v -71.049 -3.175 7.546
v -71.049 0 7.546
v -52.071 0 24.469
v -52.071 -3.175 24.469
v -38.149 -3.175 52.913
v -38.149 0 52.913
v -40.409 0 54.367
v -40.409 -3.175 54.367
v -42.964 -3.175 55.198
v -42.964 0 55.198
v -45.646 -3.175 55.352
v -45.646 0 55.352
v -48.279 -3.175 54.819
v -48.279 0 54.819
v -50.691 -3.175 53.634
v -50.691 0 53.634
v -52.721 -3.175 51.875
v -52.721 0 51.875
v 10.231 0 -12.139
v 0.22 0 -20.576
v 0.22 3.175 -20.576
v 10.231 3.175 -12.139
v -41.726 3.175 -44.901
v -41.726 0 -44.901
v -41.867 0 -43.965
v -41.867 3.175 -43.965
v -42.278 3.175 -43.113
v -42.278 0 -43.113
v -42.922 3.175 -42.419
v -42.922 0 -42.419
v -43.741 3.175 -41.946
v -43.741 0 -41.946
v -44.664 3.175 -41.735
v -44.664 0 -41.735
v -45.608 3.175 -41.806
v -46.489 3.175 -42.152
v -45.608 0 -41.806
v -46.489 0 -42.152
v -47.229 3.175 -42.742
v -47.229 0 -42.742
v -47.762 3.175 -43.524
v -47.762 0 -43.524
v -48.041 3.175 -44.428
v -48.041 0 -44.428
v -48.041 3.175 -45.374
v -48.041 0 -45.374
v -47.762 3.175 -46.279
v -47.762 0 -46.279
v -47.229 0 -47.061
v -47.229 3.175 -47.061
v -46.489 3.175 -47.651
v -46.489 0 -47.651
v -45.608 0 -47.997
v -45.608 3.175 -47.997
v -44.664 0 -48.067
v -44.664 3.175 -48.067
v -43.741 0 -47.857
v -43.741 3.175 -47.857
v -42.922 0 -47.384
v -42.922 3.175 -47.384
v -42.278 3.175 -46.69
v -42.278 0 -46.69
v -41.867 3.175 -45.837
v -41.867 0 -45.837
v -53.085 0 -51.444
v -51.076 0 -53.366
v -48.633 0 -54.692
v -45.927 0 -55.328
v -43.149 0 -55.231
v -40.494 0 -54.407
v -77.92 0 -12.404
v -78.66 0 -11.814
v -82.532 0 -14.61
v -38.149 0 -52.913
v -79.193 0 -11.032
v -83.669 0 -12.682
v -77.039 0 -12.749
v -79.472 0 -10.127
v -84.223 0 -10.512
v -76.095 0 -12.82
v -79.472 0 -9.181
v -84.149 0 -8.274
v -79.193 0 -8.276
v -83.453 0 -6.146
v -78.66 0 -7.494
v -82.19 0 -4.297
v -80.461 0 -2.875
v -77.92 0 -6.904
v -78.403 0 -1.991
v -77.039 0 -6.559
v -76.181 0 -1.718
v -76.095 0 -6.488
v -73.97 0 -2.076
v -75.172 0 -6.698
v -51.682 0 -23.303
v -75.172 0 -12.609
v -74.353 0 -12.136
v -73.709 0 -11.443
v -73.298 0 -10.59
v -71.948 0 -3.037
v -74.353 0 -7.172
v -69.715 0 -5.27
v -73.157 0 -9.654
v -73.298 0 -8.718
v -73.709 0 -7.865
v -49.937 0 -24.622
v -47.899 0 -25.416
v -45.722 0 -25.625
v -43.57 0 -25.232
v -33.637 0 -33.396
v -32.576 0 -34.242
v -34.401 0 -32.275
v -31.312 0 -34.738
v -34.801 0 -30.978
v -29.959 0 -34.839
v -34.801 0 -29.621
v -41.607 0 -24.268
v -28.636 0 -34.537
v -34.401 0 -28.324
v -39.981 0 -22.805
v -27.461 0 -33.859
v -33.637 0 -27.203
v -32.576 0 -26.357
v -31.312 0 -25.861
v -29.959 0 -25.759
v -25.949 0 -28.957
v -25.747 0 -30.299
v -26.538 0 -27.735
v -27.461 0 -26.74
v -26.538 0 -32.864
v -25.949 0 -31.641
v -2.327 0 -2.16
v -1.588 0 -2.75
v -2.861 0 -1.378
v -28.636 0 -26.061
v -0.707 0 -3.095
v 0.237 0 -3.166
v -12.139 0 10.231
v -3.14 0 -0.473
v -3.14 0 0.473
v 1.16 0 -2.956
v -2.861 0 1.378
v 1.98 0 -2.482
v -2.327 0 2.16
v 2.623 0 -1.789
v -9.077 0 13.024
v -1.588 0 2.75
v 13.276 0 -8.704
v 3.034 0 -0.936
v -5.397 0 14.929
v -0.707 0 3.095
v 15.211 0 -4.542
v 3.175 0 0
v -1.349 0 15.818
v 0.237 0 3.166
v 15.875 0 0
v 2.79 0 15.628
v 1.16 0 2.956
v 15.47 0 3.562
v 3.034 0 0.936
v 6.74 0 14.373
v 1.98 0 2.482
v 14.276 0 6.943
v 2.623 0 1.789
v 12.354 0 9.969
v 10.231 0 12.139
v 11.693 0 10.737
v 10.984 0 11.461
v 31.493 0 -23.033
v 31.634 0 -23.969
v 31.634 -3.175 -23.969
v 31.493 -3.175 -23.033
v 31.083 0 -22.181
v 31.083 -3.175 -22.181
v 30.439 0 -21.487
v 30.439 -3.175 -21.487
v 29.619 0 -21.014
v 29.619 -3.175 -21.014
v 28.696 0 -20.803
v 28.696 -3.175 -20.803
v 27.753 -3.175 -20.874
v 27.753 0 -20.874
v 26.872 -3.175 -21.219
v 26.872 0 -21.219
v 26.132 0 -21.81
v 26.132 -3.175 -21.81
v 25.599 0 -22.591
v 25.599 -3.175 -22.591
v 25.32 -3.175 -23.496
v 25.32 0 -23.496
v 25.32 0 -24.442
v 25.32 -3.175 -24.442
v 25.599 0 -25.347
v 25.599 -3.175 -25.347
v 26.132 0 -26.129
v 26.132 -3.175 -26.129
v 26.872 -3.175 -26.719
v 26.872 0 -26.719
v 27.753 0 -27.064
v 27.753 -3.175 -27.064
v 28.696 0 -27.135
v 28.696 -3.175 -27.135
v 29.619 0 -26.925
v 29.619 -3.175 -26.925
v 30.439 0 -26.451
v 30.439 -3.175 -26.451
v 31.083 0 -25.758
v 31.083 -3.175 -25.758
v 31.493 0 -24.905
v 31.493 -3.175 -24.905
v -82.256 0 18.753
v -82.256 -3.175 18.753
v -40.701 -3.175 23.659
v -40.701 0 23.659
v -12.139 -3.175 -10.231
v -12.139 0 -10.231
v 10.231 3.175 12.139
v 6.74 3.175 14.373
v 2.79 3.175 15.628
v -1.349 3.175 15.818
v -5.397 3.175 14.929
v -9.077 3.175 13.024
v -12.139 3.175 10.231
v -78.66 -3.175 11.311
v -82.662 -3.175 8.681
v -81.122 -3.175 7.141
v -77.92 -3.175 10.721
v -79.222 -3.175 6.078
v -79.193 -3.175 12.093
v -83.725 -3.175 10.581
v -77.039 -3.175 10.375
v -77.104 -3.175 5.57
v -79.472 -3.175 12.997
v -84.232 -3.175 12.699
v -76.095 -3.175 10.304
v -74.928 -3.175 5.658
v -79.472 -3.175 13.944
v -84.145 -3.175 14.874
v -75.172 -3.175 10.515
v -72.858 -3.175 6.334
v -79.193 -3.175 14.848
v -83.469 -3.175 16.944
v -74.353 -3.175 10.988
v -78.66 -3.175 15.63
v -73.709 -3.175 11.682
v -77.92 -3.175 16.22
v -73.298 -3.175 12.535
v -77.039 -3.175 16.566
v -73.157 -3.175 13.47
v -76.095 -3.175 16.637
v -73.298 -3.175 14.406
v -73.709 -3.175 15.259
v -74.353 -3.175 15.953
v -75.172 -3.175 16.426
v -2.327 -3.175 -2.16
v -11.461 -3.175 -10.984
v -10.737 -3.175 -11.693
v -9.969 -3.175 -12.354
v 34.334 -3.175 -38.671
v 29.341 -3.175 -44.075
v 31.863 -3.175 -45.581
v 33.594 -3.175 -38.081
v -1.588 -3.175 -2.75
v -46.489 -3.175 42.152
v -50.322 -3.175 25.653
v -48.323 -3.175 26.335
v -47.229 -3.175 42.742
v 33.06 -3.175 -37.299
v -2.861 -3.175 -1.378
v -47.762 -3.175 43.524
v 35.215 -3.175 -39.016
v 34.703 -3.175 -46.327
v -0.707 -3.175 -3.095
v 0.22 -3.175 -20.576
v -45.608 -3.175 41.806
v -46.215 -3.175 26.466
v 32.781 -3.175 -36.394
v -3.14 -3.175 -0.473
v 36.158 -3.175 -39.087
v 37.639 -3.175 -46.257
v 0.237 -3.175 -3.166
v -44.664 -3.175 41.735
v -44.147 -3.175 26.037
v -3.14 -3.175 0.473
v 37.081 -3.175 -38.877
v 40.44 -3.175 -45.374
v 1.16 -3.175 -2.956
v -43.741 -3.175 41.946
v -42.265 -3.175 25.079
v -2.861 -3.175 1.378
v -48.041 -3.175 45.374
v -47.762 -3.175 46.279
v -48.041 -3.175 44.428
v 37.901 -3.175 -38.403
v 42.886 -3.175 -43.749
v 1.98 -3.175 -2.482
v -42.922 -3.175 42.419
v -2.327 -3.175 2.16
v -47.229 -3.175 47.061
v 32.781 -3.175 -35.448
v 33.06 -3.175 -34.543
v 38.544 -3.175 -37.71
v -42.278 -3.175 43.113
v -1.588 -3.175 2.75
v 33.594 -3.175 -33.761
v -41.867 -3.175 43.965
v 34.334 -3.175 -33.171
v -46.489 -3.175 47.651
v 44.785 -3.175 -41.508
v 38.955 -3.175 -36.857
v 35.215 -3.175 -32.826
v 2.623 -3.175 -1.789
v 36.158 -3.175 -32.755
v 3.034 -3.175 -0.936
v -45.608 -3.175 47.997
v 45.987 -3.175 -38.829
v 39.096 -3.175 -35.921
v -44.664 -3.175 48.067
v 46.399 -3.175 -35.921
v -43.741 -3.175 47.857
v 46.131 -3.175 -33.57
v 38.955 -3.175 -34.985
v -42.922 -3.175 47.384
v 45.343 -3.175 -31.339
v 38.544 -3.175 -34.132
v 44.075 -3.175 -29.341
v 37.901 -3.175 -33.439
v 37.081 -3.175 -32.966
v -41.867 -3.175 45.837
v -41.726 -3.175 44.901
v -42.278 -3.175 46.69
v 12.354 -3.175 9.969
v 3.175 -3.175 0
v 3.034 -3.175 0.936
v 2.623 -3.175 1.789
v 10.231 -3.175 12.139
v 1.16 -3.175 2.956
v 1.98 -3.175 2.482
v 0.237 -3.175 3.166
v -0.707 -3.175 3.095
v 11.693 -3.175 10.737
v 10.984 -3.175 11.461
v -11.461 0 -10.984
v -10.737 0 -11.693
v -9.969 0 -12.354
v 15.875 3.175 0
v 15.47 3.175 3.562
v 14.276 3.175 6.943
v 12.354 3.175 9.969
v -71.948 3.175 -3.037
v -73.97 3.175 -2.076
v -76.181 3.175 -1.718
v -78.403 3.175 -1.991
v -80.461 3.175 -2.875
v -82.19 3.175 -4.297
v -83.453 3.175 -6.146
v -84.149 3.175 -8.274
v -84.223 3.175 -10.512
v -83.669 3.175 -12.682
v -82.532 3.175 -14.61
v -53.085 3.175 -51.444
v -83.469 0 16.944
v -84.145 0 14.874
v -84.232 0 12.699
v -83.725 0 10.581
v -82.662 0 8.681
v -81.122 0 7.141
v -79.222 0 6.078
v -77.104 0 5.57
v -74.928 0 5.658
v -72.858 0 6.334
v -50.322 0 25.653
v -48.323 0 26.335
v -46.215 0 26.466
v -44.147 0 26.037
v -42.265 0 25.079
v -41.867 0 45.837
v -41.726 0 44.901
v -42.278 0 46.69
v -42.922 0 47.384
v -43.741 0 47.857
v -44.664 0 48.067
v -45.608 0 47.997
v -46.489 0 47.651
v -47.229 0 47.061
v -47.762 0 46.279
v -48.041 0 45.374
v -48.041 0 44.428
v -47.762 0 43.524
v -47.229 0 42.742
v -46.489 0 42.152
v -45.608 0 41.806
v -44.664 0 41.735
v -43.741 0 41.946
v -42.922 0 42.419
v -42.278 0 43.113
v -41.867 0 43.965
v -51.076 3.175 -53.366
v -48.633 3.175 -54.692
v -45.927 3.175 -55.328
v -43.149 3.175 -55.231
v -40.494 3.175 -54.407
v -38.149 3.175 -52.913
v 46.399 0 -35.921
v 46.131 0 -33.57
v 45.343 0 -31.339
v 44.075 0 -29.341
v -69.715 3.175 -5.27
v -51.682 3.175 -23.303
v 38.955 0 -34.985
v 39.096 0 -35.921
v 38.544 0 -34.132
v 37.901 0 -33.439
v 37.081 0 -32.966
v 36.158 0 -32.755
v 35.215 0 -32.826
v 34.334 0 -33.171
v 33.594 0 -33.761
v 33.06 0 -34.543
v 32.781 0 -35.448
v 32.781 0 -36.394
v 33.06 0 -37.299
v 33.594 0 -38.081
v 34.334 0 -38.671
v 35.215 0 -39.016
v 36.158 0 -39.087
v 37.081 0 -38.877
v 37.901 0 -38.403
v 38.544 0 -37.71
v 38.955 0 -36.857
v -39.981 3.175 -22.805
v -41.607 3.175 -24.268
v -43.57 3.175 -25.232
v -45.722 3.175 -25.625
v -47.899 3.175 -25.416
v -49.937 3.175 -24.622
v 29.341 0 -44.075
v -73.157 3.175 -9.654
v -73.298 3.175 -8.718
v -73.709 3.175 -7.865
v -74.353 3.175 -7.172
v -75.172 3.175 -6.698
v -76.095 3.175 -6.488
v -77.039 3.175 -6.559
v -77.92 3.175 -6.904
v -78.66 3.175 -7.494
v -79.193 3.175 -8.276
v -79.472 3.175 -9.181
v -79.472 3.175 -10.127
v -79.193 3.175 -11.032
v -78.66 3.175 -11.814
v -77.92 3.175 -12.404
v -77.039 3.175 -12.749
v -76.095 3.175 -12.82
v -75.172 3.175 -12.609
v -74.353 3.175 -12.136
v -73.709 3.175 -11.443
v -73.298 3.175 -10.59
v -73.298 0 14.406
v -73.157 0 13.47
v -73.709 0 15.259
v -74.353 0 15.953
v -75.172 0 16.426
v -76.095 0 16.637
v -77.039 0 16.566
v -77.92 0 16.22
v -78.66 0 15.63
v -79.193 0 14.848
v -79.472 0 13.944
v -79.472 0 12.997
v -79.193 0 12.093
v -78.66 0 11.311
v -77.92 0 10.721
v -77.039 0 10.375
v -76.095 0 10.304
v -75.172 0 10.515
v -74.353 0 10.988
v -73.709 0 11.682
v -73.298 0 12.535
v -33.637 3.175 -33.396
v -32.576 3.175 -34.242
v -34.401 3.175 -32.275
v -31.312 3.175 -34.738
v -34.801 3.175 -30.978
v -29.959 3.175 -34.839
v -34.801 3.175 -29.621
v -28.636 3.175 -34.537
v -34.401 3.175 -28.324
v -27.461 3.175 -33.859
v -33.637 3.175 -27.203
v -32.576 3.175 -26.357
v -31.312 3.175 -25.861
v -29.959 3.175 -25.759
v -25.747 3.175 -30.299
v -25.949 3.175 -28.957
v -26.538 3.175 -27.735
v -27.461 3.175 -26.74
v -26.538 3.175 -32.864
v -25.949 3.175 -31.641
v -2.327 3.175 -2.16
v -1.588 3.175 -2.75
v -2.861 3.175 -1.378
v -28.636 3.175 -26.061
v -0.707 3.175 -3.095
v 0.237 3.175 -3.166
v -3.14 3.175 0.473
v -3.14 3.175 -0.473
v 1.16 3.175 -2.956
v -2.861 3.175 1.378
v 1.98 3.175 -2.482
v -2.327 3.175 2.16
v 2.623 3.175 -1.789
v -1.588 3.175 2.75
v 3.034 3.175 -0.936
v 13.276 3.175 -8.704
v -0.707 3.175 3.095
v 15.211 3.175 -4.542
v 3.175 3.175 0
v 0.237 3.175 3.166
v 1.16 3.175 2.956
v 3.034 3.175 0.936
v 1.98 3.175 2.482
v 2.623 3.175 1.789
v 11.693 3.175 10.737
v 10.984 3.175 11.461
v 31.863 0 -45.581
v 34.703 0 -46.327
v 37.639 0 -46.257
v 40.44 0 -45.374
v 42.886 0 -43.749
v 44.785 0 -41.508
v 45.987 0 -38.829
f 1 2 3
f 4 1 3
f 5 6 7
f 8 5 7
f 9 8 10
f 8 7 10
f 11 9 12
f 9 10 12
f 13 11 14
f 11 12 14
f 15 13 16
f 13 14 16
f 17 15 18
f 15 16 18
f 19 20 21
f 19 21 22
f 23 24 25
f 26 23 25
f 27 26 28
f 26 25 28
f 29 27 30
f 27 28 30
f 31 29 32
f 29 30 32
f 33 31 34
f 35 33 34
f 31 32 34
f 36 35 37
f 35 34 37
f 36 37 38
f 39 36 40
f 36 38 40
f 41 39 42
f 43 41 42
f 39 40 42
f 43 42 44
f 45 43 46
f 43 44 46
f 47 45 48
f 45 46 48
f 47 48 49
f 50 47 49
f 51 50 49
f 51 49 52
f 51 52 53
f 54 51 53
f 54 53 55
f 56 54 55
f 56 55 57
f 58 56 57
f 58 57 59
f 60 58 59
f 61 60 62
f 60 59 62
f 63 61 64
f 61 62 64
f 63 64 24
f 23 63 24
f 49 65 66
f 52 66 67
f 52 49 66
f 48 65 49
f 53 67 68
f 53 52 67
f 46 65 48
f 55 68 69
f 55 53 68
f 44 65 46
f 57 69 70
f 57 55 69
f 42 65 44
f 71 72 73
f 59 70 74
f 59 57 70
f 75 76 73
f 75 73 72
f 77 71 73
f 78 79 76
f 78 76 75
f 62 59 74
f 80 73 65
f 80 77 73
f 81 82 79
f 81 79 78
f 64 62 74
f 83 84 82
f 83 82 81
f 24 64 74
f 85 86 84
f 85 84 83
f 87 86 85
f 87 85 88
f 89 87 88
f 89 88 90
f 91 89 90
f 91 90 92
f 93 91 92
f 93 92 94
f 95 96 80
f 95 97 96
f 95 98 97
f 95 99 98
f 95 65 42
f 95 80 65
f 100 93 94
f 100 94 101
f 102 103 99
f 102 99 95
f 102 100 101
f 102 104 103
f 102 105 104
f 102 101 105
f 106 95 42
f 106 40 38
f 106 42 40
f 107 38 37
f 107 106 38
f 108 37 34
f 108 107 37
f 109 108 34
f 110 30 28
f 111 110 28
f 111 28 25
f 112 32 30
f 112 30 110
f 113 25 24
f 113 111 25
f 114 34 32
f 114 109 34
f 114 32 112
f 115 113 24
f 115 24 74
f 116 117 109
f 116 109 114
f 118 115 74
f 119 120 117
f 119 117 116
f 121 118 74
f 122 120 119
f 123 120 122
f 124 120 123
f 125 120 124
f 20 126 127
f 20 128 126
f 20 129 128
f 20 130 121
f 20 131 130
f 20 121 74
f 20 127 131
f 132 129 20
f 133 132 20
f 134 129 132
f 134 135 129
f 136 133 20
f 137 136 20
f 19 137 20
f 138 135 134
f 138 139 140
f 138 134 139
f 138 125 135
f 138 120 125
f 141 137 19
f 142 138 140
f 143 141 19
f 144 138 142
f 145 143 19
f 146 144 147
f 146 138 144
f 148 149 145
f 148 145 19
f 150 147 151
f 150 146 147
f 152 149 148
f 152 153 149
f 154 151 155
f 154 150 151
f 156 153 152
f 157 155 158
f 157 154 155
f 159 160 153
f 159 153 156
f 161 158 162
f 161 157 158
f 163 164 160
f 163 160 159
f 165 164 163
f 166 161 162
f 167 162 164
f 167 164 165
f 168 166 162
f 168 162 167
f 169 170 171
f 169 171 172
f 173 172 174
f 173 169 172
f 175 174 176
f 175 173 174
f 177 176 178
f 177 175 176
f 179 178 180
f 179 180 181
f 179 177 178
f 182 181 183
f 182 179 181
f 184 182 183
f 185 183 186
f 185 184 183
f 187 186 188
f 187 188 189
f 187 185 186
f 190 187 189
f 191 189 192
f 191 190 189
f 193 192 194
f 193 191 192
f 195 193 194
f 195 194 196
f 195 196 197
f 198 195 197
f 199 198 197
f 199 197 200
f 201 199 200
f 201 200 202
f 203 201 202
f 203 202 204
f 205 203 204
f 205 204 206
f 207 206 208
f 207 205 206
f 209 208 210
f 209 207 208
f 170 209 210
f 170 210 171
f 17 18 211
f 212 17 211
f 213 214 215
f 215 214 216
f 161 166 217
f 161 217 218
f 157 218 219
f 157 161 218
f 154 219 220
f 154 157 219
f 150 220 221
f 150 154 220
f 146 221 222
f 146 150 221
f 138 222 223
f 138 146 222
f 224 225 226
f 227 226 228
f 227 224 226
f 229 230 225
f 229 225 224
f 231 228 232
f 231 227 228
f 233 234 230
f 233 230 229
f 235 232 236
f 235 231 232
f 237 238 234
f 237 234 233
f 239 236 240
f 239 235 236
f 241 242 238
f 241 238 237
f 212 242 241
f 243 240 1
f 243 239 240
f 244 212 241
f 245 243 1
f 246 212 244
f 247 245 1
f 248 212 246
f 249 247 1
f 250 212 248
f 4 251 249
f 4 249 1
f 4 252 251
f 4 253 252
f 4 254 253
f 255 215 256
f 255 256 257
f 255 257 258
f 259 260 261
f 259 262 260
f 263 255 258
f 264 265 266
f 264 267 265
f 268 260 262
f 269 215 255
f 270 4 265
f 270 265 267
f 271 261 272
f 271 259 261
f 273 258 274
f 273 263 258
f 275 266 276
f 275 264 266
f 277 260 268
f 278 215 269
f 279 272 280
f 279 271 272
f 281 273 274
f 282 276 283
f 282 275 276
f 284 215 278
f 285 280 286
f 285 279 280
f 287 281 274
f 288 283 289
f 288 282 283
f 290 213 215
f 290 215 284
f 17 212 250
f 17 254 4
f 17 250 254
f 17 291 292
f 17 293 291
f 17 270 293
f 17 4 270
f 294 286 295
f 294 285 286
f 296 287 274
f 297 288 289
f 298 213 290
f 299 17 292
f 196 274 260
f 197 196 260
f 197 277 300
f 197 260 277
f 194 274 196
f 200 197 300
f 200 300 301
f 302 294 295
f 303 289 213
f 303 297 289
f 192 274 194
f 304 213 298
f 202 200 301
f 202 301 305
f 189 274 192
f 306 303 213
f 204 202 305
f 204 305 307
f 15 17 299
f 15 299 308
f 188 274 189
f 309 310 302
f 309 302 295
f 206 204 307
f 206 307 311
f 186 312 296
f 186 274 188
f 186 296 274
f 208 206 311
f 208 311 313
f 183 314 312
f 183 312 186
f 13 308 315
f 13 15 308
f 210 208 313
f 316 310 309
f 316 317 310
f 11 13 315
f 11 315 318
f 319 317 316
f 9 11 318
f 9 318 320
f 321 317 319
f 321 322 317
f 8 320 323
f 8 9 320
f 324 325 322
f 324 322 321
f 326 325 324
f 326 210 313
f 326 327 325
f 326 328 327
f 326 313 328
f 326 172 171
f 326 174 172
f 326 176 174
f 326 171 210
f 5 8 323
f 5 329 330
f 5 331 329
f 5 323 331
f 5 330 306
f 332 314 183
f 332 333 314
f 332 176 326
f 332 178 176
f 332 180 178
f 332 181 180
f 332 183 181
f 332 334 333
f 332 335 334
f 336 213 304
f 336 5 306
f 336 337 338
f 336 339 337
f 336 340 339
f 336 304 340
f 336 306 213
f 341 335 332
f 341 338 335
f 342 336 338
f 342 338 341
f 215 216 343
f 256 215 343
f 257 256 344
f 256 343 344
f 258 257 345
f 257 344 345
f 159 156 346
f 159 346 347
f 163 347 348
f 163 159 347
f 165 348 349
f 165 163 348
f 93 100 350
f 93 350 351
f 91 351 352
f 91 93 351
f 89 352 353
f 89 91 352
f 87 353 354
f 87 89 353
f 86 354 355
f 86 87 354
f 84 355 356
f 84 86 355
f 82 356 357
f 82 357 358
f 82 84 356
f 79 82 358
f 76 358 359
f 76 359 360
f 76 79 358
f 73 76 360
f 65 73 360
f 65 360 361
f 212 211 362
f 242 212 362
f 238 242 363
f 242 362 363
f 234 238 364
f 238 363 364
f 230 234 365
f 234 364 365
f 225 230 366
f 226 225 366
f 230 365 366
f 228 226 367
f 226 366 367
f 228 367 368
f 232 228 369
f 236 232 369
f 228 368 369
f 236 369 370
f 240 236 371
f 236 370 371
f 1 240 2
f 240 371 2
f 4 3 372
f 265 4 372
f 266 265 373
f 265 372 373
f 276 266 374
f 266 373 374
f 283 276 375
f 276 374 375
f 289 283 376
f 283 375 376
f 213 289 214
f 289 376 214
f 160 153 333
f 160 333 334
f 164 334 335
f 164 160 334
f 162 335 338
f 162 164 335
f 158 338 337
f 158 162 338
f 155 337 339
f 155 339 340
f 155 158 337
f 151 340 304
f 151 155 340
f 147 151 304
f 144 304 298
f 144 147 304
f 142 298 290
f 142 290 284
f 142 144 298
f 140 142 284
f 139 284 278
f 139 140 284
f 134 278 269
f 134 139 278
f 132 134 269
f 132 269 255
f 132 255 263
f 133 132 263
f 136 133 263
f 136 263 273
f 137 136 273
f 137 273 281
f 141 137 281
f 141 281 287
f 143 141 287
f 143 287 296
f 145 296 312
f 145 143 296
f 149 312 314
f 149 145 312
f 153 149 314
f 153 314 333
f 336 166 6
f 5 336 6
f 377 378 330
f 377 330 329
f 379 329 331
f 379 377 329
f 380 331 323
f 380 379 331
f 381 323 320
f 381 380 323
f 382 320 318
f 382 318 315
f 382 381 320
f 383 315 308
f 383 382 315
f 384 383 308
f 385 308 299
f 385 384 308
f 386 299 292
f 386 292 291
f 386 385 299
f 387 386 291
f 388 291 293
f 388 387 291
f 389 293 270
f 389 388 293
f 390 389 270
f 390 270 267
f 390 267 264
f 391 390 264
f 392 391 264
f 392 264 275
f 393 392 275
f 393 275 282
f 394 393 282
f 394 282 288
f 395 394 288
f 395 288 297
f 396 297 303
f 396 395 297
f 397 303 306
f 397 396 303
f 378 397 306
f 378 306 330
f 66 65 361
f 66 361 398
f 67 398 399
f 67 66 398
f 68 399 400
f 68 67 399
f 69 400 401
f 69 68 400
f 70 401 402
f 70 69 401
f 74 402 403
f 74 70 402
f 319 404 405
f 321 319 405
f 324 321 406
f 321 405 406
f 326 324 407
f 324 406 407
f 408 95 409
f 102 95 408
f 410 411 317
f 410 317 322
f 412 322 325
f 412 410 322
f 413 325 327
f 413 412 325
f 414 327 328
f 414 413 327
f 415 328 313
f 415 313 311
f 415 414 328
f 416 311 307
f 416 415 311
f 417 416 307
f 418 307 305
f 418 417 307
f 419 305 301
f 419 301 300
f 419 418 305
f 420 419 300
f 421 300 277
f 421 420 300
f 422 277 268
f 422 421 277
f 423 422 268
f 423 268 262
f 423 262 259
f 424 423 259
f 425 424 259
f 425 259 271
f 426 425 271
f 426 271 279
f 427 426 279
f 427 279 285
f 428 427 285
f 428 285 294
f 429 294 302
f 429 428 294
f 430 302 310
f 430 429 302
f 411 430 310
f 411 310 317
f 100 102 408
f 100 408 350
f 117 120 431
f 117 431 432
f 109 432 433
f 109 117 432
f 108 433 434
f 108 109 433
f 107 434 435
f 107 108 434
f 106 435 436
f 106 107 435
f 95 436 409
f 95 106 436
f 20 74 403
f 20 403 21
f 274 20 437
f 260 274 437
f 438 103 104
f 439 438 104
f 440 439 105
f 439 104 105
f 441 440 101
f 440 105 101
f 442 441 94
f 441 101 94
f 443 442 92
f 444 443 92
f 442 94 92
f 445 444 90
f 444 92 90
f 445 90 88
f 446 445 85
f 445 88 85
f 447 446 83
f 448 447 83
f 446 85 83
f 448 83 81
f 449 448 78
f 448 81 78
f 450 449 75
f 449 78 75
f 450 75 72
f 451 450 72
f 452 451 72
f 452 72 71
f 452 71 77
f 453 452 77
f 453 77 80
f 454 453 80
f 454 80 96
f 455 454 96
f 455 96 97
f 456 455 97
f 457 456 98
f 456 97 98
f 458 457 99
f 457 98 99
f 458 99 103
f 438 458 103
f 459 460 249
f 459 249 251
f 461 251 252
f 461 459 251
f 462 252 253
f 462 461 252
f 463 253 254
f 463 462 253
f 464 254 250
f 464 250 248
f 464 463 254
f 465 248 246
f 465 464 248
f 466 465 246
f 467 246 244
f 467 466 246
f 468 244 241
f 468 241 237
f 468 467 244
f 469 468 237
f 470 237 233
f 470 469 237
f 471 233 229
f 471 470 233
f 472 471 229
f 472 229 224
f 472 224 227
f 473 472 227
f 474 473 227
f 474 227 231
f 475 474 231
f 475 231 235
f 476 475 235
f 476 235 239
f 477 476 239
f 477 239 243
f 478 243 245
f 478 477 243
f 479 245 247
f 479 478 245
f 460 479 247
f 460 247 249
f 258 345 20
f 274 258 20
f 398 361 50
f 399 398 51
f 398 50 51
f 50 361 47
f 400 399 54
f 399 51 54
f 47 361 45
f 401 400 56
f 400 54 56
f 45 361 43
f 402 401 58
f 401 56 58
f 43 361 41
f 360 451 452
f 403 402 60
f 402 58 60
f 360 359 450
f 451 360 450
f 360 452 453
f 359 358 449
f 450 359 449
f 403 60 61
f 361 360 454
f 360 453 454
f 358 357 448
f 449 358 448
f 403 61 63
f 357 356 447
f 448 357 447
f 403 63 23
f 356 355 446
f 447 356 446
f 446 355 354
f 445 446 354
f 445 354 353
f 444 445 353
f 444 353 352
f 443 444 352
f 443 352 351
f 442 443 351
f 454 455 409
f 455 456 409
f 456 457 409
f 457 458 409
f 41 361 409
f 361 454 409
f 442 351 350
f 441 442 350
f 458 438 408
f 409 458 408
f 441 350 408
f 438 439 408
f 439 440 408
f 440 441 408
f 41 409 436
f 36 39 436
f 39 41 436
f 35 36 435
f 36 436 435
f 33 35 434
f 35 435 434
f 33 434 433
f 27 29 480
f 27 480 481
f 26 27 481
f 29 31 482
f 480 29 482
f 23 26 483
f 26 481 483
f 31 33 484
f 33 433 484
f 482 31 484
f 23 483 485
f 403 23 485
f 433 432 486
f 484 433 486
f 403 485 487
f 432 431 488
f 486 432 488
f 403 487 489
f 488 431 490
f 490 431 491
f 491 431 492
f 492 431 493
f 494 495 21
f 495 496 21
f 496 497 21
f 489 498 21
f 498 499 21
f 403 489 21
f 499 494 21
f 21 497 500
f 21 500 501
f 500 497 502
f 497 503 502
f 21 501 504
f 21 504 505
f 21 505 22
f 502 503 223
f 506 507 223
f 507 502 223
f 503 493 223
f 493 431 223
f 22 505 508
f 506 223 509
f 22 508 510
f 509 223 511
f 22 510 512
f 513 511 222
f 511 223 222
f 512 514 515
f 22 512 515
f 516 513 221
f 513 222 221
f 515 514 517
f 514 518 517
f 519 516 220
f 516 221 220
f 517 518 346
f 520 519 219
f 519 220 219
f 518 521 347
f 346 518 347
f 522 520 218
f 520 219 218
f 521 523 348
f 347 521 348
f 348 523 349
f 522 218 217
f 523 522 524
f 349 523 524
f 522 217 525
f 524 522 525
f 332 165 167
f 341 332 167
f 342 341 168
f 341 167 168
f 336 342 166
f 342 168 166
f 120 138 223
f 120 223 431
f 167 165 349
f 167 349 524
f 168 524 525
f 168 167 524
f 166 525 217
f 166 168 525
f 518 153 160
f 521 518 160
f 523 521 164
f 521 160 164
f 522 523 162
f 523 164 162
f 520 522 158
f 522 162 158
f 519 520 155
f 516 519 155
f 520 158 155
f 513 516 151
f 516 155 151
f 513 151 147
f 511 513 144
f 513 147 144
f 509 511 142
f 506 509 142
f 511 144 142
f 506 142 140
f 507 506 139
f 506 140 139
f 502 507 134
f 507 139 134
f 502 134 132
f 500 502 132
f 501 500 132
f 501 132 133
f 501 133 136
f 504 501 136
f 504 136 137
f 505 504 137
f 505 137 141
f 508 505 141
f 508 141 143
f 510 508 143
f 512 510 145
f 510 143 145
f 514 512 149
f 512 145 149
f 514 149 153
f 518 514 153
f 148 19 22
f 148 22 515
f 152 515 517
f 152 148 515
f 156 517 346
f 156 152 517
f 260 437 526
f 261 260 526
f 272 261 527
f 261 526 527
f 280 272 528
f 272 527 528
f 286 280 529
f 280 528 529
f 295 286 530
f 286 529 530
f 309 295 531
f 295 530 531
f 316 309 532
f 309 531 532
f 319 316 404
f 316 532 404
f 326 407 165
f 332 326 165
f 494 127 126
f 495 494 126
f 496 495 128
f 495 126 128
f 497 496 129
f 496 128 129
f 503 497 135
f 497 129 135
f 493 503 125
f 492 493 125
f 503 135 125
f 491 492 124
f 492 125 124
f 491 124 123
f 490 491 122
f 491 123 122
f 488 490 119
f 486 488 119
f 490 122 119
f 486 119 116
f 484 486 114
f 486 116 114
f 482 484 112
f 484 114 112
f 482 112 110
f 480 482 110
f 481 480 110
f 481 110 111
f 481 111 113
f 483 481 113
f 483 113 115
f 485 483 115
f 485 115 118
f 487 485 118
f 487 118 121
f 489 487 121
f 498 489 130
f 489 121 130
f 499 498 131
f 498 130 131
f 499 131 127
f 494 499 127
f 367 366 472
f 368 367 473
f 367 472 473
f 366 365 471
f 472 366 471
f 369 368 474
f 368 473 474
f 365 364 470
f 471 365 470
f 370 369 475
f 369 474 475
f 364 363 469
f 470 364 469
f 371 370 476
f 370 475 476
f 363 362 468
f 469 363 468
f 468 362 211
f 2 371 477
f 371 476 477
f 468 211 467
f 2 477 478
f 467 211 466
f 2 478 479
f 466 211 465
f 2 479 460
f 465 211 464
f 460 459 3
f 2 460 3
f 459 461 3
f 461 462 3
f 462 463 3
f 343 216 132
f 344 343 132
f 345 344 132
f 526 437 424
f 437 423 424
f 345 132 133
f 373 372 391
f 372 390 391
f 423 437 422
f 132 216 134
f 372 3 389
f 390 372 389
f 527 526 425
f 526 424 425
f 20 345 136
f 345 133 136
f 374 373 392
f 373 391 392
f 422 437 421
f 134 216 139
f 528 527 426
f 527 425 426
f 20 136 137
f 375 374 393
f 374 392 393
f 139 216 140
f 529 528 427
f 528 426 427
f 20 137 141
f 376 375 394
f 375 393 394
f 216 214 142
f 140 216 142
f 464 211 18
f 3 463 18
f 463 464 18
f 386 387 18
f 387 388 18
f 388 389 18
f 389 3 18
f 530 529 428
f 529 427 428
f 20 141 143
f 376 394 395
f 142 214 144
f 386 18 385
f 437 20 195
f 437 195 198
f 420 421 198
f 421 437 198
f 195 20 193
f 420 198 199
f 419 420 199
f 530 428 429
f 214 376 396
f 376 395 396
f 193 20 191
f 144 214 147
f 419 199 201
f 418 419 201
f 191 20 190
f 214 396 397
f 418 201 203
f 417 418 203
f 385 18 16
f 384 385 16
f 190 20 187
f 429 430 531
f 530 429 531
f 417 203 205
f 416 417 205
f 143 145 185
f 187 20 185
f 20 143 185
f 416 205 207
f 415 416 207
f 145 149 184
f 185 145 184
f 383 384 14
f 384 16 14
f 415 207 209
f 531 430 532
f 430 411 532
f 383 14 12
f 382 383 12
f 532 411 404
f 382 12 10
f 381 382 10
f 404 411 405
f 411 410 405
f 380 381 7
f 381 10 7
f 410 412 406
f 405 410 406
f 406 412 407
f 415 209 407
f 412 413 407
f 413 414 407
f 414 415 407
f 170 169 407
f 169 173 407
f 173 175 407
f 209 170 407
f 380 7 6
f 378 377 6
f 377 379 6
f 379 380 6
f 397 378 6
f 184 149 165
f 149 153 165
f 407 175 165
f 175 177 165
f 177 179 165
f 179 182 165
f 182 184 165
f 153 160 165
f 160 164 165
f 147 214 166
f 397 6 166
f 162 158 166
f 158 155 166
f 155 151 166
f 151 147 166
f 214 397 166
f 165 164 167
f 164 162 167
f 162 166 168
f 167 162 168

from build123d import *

# Parameters (mm, degrees)
F0_R     = 3.175
F0_R_2   = 3.9751
F1_DEPTH = 3.175
F0_R_3   = 4.55279125
F2_DEPTH = 3.175


# Not quite as in the source:
# - a feature names something its author has since deleted; it is built from what else it names


with BuildPart() as f1:
    # F0 (on Front) → F1 (new body)
    with BuildSketch(Plane.XZ):
        with BuildLine():
            ThreePointArc((-82.2563895183, 18.7531498051), (-73.5054766898, 20.8875043398), (-68.3946770291, 13.4703841816))
            ThreePointArc((-68.3946770291, 13.4703841816), (-69.08870209, 10.2244671992), (-71.0494114056, 7.5461716924))
            Line((-71.0494114056, 7.5461716924), (-52.0712687873, 24.4694470818))
            ThreePointArc((-52.0712687873, 24.4694470818), (-46.2149635715, 26.465847689), (-40.7009159693, 23.6592117657))
            Line((-40.7009159693, 23.6592117657), (-20.7610835727, 0))
            Line((-20.7610835727, 0), (-12.1388473833, 10.2305429575))
            ThreePointArc((-12.1388473833, 10.2305429575), (-1.349375, 15.817547601), (10.2305429575, 12.1388473833))
            Line((10.2305429575, 12.1388473833), (-38.1491222534, 52.9129198783))
            ThreePointArc((-38.1491222534, 52.9129198783), (-35.4006557474, 49.3189874266), (-34.4237806053, 44.9012806053))
            ThreePointArc((-34.4237806053, 44.9012806053), (-48.6325250533, 35.1106819965), (-52.7212410911, 51.8745312283))
            Line((-52.7212410911, 51.8745312283), (-82.2563895183, 18.7531498051))
        make_face()
        with BuildLine():
            ThreePointArc((-71.0494114056, 7.5461716924), (-69.08870209, 10.2244671992), (-68.3946770291, 13.4703841816))
            ThreePointArc((-68.3946770291, 13.4703841816), (-73.5054766898, 20.8875043398), (-82.2563895183, 18.7531498051))
            ThreePointArc((-82.2563895183, 18.7531498051), (-81.9448371048, 7.8577241059), (-71.0494114056, 7.5461716924))
        make_face()
        with Locations((-76.3321770291, 13.4703841816)):
            Circle(F0_R, mode=Mode.SUBTRACT)
        with BuildLine():
            ThreePointArc((-38.1491222534, 52.9129198783), (-45.6460041086, 55.35228023), (-52.7212410911, 51.8745312283))
            ThreePointArc((-52.7212410911, 51.8745312283), (-48.6325250533, 35.1106819965), (-34.4237806053, 44.9012806053))
            ThreePointArc((-34.4237806053, 44.9012806053), (-35.4006557474, 49.3189874266), (-38.1491222534, 52.9129198783))
        make_face()
        with Locations((-44.9012806053, 44.9012806053)):
            Circle(F0_R, mode=Mode.SUBTRACT)
        with BuildLine():
            Line((-12.1388473833, 10.2305429575), (-20.7610835727, 0))
            Line((-20.7610835727, 0), (-12.1388473833, -10.2305429575))
            ThreePointArc((-12.1388473833, -10.2305429575), (-15.875, 0), (-12.1388473833, 10.2305429575))
        make_face()
        with BuildLine():
            ThreePointArc((10.2305429575, -12.1388473833), (0.1694484732, -15.8740956346), (-9.9690883749, -12.354468907))
            Line((-9.9690883749, -12.354468907), (0.2196387976, -20.5759733985))
            Line((0.2196387976, -20.5759733985), (10.2305429575, -12.1388473833))
        make_face()
        with BuildLine():
            Line((44.0749739629, -29.3414261569), (12.354468907, 9.9690883749))
            ThreePointArc((12.354468907, 9.9690883749), (14.9690149793, 5.2862288591), (15.875, 0))
            ThreePointArc((15.875, 0), (14.3948861484, -6.6934951837), (10.2305429575, -12.1388473833))
            Line((10.2305429575, -12.1388473833), (0.2196387976, -20.5759733985))
            Line((0.2196387976, -20.5759733985), (29.3414261569, -44.0749739629))
            ThreePointArc((29.3414261569, -44.0749739629), (28.5123131844, -28.5123131844), (44.0749739629, -29.3414261569))
        make_face()
        with Locations((28.4592052015, -23.969077141)):
            Circle(F0_R, mode=Mode.SUBTRACT)
        with BuildLine():
            ThreePointArc((46.3985244843, -35.9210244843), (45.8005743706, -32.4321134373), (44.0749739629, -29.3414261569))
            ThreePointArc((44.0749739629, -29.3414261569), (28.5123131844, -28.5123131844), (29.3414261569, -44.0749739629))
            ThreePointArc((29.3414261569, -44.0749739629), (40.4398885437, -45.3739538642), (46.3985244843, -35.9210244843))
        make_face()
        with Locations((35.9210244843, -35.9210244843)):
            Circle(F0_R, mode=Mode.SUBTRACT)
        with BuildLine():
            ThreePointArc((12.354468907, 9.9690883749), (11.3444988329, 11.1048625039), (10.2305429575, 12.1388473833))
            ThreePointArc((10.2305429575, 12.1388473833), (-1.349375, 15.817547601), (-12.1388473833, 10.2305429575))
            ThreePointArc((-12.1388473833, 10.2305429575), (-15.875, 0), (-12.1388473833, -10.2305429575))
            ThreePointArc((-12.1388473833, -10.2305429575), (-11.1048625039, -11.3444988329), (-9.9690883749, -12.354468907))
            ThreePointArc((-9.9690883749, -12.354468907), (0.1694484732, -15.8740956346), (10.2305429575, -12.1388473833))
            ThreePointArc((10.2305429575, -12.1388473833), (14.3948861484, -6.6934951837), (15.875, 0))
            ThreePointArc((15.875, 0), (14.9690149793, 5.2862288591), (12.354468907, 9.9690883749))
        make_face()
        Circle(F0_R_2, mode=Mode.SUBTRACT)
        Circle(F0_R_2)
        Circle(F0_R, mode=Mode.SUBTRACT)
    extrude(amount=F1_DEPTH)


with BuildPart() as f2:
    # F0 (on Front) → F2 (new body)
    with BuildSketch(Plane.XZ):
        with BuildLine():
            Line((-12.1388473833, -10.2305429575), (-20.7610835727, 0))
            Line((-20.7610835727, 0), (-39.9810774323, -22.8051016586))
            ThreePointArc((-39.9810774323, -22.8051016586), (-45.7220225821, -25.6246494482), (-51.6818525337, -23.3032860773))
            Line((-51.6818525337, -23.3032860773), (-69.715236479, -5.2699021319))
            ThreePointArc((-69.715236479, -5.2699021319), (-68.7319838781, -7.3646480711), (-68.3946770291, -9.6539646322))
            ThreePointArc((-68.3946770291, -9.6539646322), (-73.7060338073, -17.144443791), (-82.5319439339, -14.6104549809))
            Line((-82.5319439339, -14.6104549809), (-53.0849729197, -51.4438478655))
            ThreePointArc((-53.0849729197, -51.4438478655), (-48.3677896582, -35.0138481157), (-34.4237806053, -44.9012806053))
            ThreePointArc((-34.4237806053, -44.9012806053), (-35.4006557474, -49.3189874266), (-38.1491222534, -52.9129198783))
            Line((-38.1491222534, -52.9129198783), (0.2196387976, -20.5759733985))
            Line((0.2196387976, -20.5759733985), (-9.9690883749, -12.354468907))
            ThreePointArc((-9.9690883749, -12.354468907), (-11.1048625039, -11.3444988329), (-12.1388473833, -10.2305429575))
        make_face()
        with Locations((-30.2993841525, -30.2993841525)):
            Circle(F0_R_3, mode=Mode.SUBTRACT)
        with BuildLine():
            ThreePointArc((12.354468907, 9.9690883749), (11.3444988329, 11.1048625039), (10.2305429575, 12.1388473833))
            ThreePointArc((10.2305429575, 12.1388473833), (-1.349375, 15.817547601), (-12.1388473833, 10.2305429575))
            ThreePointArc((-12.1388473833, 10.2305429575), (-15.875, 0), (-12.1388473833, -10.2305429575))
            ThreePointArc((-12.1388473833, -10.2305429575), (-11.1048625039, -11.3444988329), (-9.9690883749, -12.354468907))
            ThreePointArc((-9.9690883749, -12.354468907), (0.1694484732, -15.8740956346), (10.2305429575, -12.1388473833))
            ThreePointArc((10.2305429575, -12.1388473833), (14.3948861484, -6.6934951837), (15.875, 0))
            ThreePointArc((15.875, 0), (14.9690149793, 5.2862288591), (12.354468907, 9.9690883749))
        make_face()
        Circle(F0_R_2, mode=Mode.SUBTRACT)
        with BuildLine():
            ThreePointArc((-53.0849729197, -51.4438478655), (-45.9268855566, -55.3284633857), (-38.1491222534, -52.9129198783))
            ThreePointArc((-38.1491222534, -52.9129198783), (-35.4006557474, -49.3189874266), (-34.4237806053, -44.9012806053))
            ThreePointArc((-34.4237806053, -44.9012806053), (-48.3677896582, -35.0138481157), (-53.0849729197, -51.4438478655))
        make_face()
        with Locations((-44.9012806053, -44.9012806053)):
            Circle(F0_R, mode=Mode.SUBTRACT)
        with BuildLine():
            ThreePointArc((-68.3946770291, -9.6539646322), (-68.7319838781, -7.3646480711), (-69.715236479, -5.2699021319))
            Line((-69.715236479, -5.2699021319), (-71.9481145287, -3.0370240822))
            ThreePointArc((-71.9481145287, -3.0370240822), (-82.1896740468, -4.2973206328), (-82.5319439339, -14.6104549809))
            ThreePointArc((-82.5319439339, -14.6104549809), (-73.7060338073, -17.144443791), (-68.3946770291, -9.6539646322))
        make_face()
        with Locations((-76.3321770291, -9.6539646322)):
            Circle(F0_R, mode=Mode.SUBTRACT)
        Circle(F0_R_2)
        Circle(F0_R, mode=Mode.SUBTRACT)
        with BuildLine():
            Line((-12.1388473833, 10.2305429575), (-20.7610835727, 0))
            Line((-20.7610835727, 0), (-12.1388473833, -10.2305429575))
            ThreePointArc((-12.1388473833, -10.2305429575), (-15.875, 0), (-12.1388473833, 10.2305429575))
        make_face()
        with BuildLine():
            ThreePointArc((10.2305429575, -12.1388473833), (0.1694484732, -15.8740956346), (-9.9690883749, -12.354468907))
            Line((-9.9690883749, -12.354468907), (0.2196387976, -20.5759733985))
            Line((0.2196387976, -20.5759733985), (10.2305429575, -12.1388473833))
        make_face()
    extrude(amount=-F2_DEPTH)


solid = Compound([f1.part, f2.part])
